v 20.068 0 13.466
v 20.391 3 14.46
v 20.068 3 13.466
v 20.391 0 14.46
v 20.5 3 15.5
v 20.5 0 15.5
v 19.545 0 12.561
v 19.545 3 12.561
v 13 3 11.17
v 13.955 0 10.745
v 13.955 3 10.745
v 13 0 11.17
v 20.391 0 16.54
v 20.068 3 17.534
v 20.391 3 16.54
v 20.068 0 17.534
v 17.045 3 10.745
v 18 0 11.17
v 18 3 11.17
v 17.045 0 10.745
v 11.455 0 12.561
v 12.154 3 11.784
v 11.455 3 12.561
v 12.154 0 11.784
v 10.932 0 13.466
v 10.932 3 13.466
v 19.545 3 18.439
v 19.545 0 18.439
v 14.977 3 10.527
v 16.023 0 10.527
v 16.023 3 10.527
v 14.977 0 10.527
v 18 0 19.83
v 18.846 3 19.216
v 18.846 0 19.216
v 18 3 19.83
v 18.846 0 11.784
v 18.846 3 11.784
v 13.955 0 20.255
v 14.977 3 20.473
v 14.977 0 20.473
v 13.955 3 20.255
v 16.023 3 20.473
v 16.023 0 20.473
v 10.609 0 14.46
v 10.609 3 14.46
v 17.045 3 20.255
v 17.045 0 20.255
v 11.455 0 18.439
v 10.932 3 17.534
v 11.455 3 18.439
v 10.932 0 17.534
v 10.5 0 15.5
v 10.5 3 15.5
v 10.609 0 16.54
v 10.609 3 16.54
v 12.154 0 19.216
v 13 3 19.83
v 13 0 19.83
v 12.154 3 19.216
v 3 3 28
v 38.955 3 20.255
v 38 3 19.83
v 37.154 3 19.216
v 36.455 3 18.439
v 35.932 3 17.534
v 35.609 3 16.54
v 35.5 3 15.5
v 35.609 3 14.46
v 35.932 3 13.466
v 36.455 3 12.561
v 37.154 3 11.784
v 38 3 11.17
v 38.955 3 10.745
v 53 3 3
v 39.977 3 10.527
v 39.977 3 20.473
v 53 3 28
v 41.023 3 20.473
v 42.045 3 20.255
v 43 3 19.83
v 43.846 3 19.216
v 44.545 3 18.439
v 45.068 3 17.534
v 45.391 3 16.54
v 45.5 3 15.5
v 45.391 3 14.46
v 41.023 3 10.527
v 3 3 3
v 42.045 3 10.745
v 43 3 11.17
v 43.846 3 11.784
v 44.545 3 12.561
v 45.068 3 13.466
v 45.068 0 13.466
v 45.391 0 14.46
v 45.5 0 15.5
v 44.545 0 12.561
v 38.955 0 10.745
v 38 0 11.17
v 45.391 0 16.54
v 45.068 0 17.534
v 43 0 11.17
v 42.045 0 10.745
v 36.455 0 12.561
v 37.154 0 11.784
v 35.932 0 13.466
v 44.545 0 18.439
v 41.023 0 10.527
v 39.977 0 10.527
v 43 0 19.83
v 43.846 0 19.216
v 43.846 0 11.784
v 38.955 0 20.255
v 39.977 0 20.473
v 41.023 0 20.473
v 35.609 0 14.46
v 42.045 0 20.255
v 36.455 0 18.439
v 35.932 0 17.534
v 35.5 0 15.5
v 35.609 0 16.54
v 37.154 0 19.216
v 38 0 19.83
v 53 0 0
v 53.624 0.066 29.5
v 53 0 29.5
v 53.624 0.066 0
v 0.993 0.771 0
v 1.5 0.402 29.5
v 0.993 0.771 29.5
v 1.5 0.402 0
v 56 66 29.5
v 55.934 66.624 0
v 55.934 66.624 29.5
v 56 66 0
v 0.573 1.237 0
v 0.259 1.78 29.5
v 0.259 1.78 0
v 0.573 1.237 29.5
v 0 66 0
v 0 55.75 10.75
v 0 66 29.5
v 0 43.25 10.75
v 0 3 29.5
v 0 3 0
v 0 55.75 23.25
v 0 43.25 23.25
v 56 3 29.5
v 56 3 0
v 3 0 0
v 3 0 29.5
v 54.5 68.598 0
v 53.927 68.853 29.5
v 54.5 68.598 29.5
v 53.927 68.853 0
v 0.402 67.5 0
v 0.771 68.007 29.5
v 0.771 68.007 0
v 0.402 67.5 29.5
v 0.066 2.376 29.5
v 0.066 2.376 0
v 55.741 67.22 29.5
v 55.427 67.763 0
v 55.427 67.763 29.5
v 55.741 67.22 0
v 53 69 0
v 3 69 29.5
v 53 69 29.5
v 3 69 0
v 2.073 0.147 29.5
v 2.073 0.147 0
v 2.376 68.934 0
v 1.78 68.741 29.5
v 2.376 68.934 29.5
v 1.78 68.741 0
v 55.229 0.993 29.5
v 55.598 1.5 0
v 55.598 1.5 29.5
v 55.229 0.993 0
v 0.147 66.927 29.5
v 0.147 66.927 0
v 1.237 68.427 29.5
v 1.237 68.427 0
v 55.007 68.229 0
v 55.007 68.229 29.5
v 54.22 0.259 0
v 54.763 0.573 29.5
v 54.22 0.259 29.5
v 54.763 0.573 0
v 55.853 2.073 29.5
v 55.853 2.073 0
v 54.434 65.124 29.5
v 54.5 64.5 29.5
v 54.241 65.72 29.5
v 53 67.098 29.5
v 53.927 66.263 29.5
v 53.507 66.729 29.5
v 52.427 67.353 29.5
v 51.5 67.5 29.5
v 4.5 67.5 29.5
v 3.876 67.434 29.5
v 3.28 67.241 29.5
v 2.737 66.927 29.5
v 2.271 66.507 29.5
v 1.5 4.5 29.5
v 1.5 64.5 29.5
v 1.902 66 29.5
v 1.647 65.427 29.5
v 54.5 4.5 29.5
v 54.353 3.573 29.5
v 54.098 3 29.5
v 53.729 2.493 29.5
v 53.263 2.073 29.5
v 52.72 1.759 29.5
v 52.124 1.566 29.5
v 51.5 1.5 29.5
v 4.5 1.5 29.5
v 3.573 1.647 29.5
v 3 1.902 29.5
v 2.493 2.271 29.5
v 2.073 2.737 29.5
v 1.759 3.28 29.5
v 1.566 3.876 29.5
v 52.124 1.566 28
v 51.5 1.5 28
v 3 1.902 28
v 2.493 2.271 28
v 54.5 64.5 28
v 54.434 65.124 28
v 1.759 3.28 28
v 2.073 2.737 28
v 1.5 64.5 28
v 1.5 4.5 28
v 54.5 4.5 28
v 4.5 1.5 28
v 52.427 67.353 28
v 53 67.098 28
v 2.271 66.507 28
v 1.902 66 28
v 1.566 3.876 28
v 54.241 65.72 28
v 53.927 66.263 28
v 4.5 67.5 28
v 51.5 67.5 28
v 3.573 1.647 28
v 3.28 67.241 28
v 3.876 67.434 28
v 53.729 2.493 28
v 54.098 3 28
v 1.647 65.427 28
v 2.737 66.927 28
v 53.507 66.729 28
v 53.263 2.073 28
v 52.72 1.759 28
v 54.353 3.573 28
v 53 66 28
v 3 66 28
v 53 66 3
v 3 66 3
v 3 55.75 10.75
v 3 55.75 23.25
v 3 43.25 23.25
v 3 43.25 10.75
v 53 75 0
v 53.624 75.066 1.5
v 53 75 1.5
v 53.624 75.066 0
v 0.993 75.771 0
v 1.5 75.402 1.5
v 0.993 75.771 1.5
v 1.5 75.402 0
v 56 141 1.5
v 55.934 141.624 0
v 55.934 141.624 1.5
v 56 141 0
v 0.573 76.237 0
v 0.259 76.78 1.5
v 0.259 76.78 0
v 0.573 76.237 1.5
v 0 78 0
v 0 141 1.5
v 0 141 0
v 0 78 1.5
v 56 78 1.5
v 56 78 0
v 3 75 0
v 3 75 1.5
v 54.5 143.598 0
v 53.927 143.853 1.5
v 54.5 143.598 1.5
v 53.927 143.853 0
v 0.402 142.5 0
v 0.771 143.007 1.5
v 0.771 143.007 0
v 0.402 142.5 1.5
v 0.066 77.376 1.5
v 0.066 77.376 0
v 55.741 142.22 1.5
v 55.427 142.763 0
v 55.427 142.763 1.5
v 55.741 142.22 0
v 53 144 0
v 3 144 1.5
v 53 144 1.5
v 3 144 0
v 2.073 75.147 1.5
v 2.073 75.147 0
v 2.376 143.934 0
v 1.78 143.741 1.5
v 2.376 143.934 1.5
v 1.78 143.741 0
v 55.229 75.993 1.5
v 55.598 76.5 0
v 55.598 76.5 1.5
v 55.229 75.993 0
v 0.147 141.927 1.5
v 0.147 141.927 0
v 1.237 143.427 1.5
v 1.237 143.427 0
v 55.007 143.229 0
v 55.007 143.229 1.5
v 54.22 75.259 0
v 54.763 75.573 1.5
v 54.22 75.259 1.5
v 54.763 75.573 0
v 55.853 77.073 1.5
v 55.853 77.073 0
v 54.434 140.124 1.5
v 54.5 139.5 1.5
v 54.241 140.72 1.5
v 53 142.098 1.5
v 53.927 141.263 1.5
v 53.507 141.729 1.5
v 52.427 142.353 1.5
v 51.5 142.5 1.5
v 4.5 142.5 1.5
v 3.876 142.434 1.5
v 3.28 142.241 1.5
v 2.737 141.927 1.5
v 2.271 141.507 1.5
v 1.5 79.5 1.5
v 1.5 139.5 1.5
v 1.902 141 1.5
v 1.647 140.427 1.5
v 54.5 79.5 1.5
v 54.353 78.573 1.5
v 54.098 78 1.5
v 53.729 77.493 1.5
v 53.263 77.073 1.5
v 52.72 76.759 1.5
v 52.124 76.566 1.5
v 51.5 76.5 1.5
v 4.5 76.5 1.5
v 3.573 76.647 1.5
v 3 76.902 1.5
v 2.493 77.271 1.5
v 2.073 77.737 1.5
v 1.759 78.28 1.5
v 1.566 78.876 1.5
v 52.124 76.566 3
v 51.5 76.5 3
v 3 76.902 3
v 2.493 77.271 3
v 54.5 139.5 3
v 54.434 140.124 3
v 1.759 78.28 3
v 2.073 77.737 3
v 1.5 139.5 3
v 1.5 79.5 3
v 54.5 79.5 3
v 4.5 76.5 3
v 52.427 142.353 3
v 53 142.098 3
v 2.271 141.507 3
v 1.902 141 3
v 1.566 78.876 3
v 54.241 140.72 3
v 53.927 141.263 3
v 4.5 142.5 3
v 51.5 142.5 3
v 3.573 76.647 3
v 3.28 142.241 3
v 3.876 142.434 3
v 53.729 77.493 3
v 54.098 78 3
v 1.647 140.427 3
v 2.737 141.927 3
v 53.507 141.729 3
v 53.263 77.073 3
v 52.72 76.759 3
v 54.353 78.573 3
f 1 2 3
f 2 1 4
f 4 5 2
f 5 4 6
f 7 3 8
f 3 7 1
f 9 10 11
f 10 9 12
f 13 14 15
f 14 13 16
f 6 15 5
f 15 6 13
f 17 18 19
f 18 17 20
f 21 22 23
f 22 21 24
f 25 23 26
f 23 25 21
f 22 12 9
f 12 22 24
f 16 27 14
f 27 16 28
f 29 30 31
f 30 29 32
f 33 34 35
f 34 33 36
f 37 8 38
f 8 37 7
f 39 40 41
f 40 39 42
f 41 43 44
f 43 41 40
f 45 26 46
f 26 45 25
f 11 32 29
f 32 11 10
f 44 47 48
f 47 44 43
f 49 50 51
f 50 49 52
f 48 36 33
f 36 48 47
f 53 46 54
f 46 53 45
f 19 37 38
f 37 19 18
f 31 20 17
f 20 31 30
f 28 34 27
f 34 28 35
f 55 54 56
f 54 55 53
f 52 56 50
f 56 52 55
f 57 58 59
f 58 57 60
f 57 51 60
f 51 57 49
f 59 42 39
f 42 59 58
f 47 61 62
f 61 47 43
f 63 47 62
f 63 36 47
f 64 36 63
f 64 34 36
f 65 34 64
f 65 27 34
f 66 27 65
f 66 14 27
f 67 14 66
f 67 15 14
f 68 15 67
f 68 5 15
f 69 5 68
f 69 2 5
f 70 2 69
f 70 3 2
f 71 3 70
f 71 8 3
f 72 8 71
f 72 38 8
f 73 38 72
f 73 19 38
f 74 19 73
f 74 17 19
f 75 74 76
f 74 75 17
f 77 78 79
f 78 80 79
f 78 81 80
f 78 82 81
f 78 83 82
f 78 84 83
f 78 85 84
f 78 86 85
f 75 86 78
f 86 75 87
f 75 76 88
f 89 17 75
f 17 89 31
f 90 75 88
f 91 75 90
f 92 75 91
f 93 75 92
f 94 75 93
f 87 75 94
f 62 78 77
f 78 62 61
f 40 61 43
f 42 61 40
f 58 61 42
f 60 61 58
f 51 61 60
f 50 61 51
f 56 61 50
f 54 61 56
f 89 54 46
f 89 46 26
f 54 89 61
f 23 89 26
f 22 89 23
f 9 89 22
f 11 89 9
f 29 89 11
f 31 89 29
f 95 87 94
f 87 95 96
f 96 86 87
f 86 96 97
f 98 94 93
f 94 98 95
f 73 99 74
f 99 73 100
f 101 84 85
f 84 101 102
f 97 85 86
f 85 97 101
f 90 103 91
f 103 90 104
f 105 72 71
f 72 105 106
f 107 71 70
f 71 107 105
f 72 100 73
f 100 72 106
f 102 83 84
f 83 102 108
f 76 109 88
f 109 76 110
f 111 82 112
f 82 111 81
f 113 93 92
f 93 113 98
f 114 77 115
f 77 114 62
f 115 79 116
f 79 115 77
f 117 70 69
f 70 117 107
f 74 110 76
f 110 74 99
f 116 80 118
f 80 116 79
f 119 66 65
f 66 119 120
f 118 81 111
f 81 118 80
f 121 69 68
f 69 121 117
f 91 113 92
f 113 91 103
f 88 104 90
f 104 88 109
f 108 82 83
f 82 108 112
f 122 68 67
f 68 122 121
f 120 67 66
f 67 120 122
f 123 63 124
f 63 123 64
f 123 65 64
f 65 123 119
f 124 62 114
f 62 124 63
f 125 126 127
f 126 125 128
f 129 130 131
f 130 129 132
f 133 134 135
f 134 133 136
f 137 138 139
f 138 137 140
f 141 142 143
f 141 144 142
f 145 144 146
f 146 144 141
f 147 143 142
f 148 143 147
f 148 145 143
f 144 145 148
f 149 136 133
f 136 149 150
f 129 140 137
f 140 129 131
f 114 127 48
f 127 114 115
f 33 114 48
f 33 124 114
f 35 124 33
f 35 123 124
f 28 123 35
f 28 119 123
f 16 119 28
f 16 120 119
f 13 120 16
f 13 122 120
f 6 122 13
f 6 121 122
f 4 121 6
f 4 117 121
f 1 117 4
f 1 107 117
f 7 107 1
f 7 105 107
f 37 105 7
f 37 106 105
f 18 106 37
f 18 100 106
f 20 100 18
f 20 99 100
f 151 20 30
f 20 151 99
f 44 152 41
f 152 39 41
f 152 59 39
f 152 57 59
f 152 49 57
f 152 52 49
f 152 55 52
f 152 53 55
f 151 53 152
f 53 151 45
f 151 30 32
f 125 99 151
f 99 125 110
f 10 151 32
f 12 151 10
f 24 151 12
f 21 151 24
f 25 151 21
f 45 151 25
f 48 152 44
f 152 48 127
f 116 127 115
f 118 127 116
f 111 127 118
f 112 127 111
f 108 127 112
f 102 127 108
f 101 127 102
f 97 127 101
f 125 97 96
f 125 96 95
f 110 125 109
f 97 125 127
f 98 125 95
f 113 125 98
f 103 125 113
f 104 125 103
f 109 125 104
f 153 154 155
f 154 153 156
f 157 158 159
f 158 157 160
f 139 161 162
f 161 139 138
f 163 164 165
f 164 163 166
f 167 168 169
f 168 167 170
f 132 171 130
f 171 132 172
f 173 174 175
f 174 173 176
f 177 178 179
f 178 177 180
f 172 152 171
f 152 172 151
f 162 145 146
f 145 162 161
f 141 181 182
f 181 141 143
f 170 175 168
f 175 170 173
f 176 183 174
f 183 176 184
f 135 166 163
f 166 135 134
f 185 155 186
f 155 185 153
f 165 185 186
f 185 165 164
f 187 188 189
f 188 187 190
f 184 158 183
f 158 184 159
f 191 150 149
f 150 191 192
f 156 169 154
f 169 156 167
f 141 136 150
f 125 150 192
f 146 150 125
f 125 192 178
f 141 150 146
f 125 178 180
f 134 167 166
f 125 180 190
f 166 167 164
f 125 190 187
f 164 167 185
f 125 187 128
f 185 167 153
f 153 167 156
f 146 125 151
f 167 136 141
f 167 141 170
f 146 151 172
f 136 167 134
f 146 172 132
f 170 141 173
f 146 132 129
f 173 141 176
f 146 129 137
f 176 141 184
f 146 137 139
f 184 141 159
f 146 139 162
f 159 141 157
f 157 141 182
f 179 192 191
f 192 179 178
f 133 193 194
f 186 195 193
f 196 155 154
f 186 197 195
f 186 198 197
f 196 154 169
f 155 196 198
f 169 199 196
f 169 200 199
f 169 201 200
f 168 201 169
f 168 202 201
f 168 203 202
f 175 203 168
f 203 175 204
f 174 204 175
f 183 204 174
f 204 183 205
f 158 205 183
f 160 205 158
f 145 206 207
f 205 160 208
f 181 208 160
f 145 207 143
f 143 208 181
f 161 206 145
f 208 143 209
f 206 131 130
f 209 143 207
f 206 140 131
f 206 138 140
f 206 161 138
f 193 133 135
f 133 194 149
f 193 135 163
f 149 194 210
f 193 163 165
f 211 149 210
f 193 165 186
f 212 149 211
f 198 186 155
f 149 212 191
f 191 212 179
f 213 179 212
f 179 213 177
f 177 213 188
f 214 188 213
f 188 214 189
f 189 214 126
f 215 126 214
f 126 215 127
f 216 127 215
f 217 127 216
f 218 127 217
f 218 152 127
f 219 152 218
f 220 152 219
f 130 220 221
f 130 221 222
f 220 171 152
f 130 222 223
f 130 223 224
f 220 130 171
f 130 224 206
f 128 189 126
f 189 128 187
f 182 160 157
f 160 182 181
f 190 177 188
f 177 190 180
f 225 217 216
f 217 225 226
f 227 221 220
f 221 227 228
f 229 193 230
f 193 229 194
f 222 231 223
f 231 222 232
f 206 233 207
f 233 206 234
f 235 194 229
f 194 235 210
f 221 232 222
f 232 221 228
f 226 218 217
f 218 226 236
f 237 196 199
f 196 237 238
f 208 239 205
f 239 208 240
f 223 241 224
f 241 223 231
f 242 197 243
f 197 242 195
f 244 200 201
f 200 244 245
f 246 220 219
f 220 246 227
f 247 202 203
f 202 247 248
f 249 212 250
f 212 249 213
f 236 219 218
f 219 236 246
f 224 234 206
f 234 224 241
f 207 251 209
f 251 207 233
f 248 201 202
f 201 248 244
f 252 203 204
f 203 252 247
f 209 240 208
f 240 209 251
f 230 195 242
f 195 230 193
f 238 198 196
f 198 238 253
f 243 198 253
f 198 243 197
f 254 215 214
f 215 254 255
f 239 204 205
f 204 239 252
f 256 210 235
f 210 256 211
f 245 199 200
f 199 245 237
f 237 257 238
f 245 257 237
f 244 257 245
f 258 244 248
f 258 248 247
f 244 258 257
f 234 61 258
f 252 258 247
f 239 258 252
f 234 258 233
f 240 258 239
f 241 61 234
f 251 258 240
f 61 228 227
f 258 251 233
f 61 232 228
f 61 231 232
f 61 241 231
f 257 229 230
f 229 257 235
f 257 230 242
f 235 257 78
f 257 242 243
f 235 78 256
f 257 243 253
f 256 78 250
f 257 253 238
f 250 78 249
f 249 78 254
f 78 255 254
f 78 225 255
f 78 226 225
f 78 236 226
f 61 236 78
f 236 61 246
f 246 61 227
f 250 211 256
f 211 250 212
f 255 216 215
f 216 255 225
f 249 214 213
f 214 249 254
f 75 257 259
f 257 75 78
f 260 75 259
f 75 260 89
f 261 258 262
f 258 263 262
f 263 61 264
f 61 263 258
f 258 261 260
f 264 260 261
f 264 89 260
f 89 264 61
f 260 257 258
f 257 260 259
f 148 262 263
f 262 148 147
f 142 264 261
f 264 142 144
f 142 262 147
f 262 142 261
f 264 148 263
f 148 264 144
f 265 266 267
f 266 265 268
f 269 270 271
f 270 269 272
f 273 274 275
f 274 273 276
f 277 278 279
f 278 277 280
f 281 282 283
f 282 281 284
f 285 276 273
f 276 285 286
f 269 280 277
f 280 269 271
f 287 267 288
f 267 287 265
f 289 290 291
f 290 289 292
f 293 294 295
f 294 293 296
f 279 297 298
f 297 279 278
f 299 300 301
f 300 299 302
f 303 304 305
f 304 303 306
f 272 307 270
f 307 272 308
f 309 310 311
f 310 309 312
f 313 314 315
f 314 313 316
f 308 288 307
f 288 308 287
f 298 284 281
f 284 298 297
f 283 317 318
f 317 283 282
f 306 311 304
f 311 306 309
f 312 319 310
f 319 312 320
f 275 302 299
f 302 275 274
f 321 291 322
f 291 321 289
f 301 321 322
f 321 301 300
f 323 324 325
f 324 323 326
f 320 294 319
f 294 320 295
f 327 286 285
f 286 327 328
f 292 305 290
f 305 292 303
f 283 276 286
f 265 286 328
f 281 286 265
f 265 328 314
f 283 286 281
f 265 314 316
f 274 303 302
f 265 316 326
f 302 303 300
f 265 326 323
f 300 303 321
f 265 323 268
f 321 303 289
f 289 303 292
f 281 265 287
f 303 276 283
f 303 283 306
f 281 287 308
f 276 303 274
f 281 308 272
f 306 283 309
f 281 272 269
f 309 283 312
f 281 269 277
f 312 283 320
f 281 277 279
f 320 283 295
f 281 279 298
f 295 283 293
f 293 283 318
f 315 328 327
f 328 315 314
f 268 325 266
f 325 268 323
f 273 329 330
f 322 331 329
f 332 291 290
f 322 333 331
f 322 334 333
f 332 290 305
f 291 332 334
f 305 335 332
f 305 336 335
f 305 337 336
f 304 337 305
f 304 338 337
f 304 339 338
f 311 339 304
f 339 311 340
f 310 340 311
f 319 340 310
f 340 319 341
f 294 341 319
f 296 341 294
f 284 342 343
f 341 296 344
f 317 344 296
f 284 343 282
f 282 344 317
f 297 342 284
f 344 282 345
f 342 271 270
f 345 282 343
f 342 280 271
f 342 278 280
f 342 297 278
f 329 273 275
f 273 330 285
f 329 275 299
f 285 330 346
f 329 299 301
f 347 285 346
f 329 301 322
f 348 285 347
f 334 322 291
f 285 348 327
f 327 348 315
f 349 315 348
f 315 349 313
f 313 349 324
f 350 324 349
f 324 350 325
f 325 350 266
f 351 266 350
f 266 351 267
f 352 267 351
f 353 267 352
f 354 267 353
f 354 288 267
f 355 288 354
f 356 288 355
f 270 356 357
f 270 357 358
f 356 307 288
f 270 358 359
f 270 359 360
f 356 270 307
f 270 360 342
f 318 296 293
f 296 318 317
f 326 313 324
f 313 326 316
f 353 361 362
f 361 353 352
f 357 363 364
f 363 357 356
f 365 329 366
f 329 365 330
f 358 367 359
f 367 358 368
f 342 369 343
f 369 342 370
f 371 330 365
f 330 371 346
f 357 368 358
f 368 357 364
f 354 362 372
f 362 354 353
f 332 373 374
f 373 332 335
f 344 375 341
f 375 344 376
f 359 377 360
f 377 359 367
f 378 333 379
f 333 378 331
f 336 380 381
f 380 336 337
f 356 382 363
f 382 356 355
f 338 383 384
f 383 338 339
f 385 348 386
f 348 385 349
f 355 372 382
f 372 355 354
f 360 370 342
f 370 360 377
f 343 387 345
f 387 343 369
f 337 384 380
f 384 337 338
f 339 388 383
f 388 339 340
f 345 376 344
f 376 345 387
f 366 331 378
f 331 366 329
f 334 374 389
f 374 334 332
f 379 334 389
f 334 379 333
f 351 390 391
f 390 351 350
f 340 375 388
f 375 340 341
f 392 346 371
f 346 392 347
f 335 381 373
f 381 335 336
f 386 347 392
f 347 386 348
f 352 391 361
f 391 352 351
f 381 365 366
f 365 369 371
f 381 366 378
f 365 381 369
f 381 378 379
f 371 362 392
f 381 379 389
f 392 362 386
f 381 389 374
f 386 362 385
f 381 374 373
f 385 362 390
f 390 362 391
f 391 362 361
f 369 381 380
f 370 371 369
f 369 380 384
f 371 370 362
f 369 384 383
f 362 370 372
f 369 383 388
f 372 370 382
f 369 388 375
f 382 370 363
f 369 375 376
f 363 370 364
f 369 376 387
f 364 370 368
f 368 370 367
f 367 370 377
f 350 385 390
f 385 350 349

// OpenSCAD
jack_count = 2;
usb_h = 16.5;
usb_v = 14;

jack_width = 25;
jack_depth = 25;
interior_width = 35 + jack_depth + 3;
interior_length = jack_width * jack_count;
interior_height = jack_width;
wall_thickness = 3;

$fn=30;

module rcube(x, y, z, r)
{
    translate([r, r, 0])
    linear_extrude(height = abs(z))
    offset(r)
    square([x - (r * 2), y - (r * 2)]);
}

module jack()
{
    translate([wall_thickness + 25/2, wall_thickness, wall_thickness + (25/2)])
    rotate([-90, 0, 0])
    {
        translate([0, 0, -11])
        cylinder(d=10, h=12);
        cylinder(d=25, h=25);
    }
}

module usb()
{
    usbsize = 12.5;
    translate([
        -2,
        -usb_h + (usbsize / 2) + interior_width + wall_thickness - usbsize ,
        usb_v -  (usbsize / 2) + wall_thickness
    ])
    cube([usbsize, usbsize, usbsize]);
}

// case bottom
difference() 
{
    // outer body
    rcube(
        interior_length + (2 * wall_thickness), 
        interior_width + (2 * wall_thickness),
        interior_height + (1.5 * wall_thickness),
        wall_thickness);

//    // top cut for lid
    translate([wall_thickness/2, wall_thickness/2, interior_height + wall_thickness])
    rcube(
        interior_length + (wall_thickness), 
        interior_width + (wall_thickness),
        wall_thickness * 2,
        wall_thickness);

    // interior cut
    translate([wall_thickness, wall_thickness, wall_thickness])
    cube(size=[
        interior_length, 
        interior_width,
        interior_height + 2 * wall_thickness]);

    // jack cutouts
    for (i = [0:1:jack_count-1])
    {
        translate([i * jack_width, 0, 0])
        jack();
    }
    
    // USB cutout
    usb();

}

// Lid
translate([0, interior_width + wall_thickness * 4, 0])
union()
{
    rcube(
        interior_length + (wall_thickness * 2), 
        interior_width + (wall_thickness * 2),
        wall_thickness/2,
        wall_thickness);

    translate([wall_thickness / 2, wall_thickness / 2, 0])
    rcube(
        interior_length + wall_thickness, 
        interior_width + wall_thickness,
        wall_thickness,
        wall_thickness);
}
